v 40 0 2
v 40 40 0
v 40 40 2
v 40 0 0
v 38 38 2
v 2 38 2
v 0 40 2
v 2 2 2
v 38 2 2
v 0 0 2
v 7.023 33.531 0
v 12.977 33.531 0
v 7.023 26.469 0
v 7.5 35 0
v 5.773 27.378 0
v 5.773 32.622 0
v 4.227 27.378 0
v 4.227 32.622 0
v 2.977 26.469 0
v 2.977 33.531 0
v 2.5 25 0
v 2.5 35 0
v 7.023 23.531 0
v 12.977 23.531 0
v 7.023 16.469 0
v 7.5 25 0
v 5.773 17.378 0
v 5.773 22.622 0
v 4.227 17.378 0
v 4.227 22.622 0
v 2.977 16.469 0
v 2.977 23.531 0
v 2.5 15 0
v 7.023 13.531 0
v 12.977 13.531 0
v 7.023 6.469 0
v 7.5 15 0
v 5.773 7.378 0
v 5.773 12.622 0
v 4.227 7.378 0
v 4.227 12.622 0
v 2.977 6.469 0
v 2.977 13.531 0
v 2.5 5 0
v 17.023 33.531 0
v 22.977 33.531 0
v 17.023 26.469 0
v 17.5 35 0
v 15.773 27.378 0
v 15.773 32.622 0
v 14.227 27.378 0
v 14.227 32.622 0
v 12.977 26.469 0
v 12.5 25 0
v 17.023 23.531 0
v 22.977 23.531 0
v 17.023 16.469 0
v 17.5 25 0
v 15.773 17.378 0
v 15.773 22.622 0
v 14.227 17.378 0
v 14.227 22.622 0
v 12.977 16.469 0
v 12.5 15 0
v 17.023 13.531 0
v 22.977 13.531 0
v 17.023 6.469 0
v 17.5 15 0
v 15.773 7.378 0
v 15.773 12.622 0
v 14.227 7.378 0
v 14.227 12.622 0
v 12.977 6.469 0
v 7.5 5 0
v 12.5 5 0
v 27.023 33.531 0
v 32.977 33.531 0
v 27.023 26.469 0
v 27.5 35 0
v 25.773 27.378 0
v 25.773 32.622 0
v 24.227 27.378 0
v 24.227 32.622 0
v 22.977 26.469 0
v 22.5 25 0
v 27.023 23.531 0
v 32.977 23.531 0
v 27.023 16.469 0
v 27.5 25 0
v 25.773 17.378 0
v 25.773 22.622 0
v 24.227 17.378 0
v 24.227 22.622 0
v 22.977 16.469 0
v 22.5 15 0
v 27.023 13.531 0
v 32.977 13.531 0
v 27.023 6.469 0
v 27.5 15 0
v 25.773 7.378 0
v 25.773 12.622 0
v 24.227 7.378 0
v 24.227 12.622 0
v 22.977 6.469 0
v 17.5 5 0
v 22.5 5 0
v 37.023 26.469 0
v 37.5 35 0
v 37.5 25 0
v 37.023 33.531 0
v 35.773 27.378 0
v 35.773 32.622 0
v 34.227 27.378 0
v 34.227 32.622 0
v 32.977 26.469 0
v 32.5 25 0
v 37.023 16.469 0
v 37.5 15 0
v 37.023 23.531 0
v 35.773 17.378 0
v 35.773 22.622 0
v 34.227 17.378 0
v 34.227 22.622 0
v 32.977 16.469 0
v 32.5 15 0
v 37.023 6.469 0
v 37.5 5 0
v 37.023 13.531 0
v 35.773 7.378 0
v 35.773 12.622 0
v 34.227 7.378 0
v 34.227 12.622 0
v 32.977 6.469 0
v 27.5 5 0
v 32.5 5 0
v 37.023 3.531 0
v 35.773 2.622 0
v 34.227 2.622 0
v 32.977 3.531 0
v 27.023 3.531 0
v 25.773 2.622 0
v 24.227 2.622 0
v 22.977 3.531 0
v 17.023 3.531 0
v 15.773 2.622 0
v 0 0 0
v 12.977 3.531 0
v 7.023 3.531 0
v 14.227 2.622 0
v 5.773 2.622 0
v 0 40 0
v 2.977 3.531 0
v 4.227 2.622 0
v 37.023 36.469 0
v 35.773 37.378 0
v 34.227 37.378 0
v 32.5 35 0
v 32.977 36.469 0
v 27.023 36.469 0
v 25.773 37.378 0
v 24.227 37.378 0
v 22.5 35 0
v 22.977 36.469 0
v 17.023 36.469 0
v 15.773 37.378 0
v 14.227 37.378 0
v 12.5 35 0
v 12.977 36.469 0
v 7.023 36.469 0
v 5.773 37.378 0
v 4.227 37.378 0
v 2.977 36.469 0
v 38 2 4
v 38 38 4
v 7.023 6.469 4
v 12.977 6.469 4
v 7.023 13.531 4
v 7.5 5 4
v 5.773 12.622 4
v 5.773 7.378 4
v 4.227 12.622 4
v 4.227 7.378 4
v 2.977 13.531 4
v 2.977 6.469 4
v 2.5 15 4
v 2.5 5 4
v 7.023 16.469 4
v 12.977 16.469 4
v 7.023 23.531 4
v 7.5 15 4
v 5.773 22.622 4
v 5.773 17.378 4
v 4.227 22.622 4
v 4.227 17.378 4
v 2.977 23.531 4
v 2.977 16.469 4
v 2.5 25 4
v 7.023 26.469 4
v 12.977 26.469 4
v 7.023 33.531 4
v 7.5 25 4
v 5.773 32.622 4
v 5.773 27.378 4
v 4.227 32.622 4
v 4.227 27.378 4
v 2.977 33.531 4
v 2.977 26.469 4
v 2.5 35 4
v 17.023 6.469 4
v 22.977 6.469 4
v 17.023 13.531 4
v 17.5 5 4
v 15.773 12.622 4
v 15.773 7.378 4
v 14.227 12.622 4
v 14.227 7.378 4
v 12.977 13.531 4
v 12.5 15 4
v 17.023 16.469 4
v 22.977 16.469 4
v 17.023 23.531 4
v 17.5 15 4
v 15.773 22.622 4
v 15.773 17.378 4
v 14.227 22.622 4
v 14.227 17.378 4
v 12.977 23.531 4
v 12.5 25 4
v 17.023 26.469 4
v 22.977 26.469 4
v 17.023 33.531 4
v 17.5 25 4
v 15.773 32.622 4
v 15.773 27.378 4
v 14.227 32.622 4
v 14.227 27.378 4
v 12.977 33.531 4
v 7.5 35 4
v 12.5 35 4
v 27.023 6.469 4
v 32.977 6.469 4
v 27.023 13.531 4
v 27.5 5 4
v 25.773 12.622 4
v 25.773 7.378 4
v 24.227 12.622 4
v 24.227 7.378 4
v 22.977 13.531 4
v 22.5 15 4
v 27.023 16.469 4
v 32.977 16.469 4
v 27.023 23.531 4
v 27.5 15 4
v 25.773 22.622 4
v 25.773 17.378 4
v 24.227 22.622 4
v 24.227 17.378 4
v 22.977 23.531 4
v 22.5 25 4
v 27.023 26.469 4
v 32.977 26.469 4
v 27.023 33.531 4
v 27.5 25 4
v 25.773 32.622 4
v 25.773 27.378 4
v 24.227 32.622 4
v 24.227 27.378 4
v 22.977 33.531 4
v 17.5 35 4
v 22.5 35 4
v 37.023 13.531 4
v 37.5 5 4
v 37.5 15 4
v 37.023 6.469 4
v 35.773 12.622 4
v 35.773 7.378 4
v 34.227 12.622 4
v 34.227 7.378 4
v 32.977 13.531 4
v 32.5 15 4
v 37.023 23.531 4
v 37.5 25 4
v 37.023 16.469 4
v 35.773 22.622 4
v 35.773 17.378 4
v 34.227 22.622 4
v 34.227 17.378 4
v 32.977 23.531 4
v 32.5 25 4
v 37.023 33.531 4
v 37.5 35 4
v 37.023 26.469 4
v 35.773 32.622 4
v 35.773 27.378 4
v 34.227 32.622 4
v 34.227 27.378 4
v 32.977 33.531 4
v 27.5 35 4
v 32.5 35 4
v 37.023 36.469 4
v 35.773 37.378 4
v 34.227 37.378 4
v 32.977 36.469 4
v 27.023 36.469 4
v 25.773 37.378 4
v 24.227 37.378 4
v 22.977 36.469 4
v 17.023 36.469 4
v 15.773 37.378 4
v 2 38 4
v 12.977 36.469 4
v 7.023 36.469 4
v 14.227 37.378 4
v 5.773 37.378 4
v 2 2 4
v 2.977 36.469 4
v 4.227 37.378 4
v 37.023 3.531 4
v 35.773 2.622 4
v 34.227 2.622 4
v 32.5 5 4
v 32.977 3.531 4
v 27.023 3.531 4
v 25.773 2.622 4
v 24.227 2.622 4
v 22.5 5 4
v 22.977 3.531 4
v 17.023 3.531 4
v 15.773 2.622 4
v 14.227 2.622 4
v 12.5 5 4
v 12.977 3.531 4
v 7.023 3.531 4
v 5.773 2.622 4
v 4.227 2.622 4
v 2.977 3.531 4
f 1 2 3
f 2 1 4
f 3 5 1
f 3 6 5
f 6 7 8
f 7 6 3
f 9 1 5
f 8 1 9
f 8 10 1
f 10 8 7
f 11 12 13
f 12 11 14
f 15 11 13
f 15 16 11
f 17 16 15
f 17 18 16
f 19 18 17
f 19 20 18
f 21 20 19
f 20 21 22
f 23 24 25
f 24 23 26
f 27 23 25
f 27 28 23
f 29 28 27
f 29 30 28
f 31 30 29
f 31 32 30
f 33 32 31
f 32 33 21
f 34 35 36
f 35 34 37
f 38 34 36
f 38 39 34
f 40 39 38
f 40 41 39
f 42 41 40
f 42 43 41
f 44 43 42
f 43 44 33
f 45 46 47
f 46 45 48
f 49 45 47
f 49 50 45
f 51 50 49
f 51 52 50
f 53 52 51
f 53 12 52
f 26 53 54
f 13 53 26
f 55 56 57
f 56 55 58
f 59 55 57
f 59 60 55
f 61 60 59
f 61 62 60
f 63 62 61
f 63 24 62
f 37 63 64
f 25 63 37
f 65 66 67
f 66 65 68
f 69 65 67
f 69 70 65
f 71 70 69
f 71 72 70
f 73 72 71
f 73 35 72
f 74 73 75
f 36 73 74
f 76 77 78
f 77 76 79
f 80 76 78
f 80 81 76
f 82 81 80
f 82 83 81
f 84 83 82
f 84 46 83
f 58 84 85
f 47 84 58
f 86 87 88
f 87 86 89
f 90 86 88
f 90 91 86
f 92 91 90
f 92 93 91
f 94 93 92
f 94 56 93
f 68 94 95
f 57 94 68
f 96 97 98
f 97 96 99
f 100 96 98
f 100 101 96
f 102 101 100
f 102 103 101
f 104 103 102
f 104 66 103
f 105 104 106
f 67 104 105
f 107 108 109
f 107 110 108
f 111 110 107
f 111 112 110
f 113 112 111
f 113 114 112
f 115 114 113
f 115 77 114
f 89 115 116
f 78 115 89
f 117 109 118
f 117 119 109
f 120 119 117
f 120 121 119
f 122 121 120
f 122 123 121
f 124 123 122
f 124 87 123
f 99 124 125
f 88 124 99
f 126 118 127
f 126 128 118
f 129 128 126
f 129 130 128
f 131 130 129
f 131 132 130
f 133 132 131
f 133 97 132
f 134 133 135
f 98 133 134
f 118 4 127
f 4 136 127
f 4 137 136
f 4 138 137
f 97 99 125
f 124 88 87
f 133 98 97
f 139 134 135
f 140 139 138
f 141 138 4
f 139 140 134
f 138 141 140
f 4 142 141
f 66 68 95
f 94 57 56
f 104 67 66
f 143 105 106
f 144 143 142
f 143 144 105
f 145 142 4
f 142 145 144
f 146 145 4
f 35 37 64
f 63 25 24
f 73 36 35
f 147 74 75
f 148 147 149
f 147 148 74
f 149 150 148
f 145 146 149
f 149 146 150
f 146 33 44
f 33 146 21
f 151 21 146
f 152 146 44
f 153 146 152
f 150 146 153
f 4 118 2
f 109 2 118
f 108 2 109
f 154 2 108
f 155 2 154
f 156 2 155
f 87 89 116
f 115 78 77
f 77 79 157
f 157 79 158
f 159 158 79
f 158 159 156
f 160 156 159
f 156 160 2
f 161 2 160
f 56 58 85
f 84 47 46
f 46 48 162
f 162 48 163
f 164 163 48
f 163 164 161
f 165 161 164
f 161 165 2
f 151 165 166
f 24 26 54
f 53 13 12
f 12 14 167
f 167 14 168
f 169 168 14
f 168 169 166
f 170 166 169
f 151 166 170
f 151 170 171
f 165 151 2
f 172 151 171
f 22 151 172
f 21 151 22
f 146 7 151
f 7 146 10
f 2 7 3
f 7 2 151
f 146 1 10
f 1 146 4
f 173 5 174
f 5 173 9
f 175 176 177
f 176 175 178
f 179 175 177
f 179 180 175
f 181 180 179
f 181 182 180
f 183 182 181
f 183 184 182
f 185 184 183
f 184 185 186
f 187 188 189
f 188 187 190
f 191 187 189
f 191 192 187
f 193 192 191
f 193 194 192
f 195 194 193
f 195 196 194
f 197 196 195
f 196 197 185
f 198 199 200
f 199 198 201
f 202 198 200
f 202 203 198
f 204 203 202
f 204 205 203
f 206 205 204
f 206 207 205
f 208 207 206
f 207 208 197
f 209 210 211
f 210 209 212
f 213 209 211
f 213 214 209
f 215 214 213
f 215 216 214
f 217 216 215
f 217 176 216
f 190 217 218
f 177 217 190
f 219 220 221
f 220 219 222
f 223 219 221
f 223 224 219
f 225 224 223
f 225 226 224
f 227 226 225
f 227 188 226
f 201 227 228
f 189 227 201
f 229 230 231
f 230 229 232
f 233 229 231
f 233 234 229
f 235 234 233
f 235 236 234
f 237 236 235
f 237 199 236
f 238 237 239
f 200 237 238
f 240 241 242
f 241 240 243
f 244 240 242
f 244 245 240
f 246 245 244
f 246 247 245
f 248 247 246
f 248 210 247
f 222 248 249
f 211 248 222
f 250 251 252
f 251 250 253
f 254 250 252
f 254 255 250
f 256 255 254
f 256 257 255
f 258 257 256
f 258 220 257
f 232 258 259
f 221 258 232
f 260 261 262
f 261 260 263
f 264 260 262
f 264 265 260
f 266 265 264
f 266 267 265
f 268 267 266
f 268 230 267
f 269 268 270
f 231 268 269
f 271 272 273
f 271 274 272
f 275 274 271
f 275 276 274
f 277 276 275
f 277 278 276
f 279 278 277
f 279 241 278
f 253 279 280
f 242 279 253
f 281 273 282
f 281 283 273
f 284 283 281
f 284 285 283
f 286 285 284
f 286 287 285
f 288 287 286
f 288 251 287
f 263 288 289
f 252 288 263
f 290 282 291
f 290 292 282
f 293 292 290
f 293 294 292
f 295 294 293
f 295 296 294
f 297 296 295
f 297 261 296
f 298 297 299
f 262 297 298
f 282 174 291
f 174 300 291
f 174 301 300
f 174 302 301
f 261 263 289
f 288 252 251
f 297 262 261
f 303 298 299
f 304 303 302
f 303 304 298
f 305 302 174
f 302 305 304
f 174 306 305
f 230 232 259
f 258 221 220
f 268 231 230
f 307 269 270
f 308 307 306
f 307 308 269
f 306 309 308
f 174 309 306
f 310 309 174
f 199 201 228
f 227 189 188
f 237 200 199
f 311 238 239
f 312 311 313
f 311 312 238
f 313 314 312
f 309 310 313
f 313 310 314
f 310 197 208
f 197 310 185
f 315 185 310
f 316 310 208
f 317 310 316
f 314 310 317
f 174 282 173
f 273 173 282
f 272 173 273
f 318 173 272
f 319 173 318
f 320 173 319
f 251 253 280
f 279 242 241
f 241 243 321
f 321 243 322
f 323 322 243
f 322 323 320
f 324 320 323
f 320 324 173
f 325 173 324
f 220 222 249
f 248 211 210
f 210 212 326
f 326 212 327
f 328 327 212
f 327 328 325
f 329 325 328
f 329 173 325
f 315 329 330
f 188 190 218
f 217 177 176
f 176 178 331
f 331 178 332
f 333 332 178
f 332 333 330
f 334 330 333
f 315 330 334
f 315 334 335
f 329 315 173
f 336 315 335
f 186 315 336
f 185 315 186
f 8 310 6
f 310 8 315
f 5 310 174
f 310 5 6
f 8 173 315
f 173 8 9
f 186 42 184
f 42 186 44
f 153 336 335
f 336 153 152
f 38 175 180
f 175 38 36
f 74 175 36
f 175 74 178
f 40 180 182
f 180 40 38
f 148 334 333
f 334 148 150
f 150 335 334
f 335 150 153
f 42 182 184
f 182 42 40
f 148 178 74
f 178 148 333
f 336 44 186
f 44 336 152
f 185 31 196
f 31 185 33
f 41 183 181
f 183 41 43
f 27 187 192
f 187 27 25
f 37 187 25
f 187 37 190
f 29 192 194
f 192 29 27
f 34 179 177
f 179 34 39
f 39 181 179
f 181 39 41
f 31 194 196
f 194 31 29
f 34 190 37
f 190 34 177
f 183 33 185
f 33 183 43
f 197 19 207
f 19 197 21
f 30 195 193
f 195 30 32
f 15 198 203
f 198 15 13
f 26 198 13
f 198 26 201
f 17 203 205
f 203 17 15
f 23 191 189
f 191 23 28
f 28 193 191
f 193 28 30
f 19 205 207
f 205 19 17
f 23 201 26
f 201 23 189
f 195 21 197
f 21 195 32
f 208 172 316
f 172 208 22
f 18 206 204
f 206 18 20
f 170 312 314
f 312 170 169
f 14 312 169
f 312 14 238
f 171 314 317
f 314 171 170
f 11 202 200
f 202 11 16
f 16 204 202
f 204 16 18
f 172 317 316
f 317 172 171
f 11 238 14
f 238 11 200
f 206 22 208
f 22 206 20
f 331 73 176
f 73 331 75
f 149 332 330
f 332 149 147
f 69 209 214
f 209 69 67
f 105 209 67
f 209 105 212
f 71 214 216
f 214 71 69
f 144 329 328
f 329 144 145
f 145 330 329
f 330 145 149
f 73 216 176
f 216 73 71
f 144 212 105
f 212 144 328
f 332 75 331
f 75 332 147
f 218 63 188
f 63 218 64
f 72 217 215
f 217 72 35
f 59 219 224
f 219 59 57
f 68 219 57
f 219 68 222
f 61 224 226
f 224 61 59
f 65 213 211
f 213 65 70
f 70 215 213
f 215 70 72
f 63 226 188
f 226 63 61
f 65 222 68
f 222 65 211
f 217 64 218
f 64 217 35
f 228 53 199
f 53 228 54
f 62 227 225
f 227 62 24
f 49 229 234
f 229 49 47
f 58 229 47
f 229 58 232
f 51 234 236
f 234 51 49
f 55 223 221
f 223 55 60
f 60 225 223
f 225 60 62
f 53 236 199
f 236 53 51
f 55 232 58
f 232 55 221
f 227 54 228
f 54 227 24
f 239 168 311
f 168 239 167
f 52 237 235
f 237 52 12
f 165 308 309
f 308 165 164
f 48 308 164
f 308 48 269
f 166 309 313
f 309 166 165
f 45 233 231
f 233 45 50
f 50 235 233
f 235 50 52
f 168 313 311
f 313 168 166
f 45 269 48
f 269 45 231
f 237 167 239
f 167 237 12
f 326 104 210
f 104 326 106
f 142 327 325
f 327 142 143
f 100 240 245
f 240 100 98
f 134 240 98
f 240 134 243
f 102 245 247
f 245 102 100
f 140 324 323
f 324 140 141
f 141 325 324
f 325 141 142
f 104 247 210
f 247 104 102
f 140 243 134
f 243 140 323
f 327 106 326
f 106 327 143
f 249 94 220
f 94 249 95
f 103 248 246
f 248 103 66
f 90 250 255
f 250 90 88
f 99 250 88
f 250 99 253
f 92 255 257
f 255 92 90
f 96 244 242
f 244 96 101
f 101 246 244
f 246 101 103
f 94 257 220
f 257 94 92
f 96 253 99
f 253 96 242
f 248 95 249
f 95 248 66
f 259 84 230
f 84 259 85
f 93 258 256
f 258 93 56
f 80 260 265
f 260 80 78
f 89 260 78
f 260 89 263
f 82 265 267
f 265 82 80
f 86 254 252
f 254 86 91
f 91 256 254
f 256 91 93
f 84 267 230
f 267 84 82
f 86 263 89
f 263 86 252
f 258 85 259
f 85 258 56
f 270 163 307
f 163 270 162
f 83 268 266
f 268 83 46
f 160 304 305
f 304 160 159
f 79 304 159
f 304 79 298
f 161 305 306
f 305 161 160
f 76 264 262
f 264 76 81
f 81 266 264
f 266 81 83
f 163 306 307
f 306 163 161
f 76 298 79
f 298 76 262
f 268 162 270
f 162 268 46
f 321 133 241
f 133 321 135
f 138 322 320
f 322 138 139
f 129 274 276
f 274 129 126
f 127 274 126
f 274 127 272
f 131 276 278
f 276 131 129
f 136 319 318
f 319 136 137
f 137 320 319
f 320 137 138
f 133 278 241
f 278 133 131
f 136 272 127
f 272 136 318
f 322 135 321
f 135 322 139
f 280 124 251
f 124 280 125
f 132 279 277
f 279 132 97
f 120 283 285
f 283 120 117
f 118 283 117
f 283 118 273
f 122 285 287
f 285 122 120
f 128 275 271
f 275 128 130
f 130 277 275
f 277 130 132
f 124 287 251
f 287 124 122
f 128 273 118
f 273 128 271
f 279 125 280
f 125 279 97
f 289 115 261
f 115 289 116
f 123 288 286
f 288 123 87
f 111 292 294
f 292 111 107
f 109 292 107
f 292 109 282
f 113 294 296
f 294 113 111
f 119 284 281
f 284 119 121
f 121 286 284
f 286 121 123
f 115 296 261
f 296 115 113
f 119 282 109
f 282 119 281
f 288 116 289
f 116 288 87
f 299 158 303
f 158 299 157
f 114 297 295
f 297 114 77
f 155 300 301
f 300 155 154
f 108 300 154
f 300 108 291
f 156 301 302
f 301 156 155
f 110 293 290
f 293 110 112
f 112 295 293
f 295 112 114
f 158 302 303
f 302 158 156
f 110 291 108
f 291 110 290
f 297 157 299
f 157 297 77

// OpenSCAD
$fn=10;
length=40;
thickness=2;

module box_bottom(size=length, thickness=thickness) {
    difference() {
        cube([size, size, size-thickness]);
        translate([thickness, thickness, thickness])
            cube([size-2*thickness, size-2*thickness, size]);
        translate([size-thickness, 15-thickness, thickness])
                cube([2* thickness, size-15, size]);
    }
}

module box_top(size=length, thickness=thickness, hole_size=5) {
    difference() {
        union() {
            cube([size, size, thickness]);
            translate([thickness, thickness, thickness])
                cube([size-2*thickness, size-2*thickness, thickness]);
        }
        for (x=[hole_size:2*hole_size:length-hole_size]) {
            for (y=[hole_size:2*hole_size:length-hole_size]) {
                translate([x, y, 0])
                    cylinder(thickness*2, r=hole_size/2);
            }
        }
    }
}


module box_assembled(size=length, thickness=thickness) {
    %main();
    translate([0,0,length])
    rotate(a=180, v=[1,1,0])
        box_top();
}

module d1_mini() {
    // main pcb
    cube([35, 26, 4], center=true);
    // wifi shield
    translate([1.75, 0, 3.5])
        cube([15.5, 12.5, 3], center=true);
    // usb power
    translate([-17.5,0, -0.5])
        cube([20, 11, 7], center=true);
}

// cutout=true to subtract from box to make space.
// cutout=false to add to box.
module display(cutout = true) {
    if (cutout) {
        cube([28,27,1]);
        translate([4, 0, 0])
            cube([19.5, 27, 5]);
        translate([0, (27-11)/2, 0])
            cube([5, 11, 5]);
    } else {
        translate([2,2,-2])
            cylinder(h=3, r=1.1);
        translate([2,25,-2])
            cylinder(h=3, r=1.1);
        translate([26,25,-2])
            cylinder(h=3, r=1.1);
        translate([26,2,-2])
            cylinder(h=3, r=1.1);
    }
}

module sensor(cutout = true) {
    if (cutout) {
        cube([26,18,1]);
        translate([4.5, 1.5, 1])
            cube([15, 15, 5]);
    } else {
        translate([2,2,-2])
            cylinder(h=3, r=1.1);
        translate([2,16,-2])
            cylinder(h=3, r=1.1);
        translate([24,16,-2])
            cylinder(h=3, r=1.1);
        translate([24,2,-2])
            cylinder(h=3, r=1.1);
    }
}

module main() {
    difference() {
        union() {
            box_bottom();
//            cube([length, thickness+4, length-13]);
        }
        translate([length/2, thickness+2, length/2])
        rotate(a=180, v=[0,1,0])
        rotate(a=90, v=[1,0,0])
            d1_mini();
        translate([thickness, (length-27)/2, (length-28)/2])
        rotate(a=-90, v=[0,1,0])
            display(cutout=true);
        translate([length-27, length-thickness, length-33])
        rotate(a=90, v=[0,-1,0])
        rotate(a=90, v=[-1,0,0])
            sensor(cutout=true);
    }
//    translate([thickness, (length-27)/2, (length-28)/2])
//    rotate(a=-90, v=[0,1,0])
//        display(cutout=false);
//    translate([(length-26)/2, length-thickness, length-13.5])
//    rotate(a=90, v=[-11,0,0])
//        sensor(cutout=false);
}

//main();
//box_assembled();
box_top();
